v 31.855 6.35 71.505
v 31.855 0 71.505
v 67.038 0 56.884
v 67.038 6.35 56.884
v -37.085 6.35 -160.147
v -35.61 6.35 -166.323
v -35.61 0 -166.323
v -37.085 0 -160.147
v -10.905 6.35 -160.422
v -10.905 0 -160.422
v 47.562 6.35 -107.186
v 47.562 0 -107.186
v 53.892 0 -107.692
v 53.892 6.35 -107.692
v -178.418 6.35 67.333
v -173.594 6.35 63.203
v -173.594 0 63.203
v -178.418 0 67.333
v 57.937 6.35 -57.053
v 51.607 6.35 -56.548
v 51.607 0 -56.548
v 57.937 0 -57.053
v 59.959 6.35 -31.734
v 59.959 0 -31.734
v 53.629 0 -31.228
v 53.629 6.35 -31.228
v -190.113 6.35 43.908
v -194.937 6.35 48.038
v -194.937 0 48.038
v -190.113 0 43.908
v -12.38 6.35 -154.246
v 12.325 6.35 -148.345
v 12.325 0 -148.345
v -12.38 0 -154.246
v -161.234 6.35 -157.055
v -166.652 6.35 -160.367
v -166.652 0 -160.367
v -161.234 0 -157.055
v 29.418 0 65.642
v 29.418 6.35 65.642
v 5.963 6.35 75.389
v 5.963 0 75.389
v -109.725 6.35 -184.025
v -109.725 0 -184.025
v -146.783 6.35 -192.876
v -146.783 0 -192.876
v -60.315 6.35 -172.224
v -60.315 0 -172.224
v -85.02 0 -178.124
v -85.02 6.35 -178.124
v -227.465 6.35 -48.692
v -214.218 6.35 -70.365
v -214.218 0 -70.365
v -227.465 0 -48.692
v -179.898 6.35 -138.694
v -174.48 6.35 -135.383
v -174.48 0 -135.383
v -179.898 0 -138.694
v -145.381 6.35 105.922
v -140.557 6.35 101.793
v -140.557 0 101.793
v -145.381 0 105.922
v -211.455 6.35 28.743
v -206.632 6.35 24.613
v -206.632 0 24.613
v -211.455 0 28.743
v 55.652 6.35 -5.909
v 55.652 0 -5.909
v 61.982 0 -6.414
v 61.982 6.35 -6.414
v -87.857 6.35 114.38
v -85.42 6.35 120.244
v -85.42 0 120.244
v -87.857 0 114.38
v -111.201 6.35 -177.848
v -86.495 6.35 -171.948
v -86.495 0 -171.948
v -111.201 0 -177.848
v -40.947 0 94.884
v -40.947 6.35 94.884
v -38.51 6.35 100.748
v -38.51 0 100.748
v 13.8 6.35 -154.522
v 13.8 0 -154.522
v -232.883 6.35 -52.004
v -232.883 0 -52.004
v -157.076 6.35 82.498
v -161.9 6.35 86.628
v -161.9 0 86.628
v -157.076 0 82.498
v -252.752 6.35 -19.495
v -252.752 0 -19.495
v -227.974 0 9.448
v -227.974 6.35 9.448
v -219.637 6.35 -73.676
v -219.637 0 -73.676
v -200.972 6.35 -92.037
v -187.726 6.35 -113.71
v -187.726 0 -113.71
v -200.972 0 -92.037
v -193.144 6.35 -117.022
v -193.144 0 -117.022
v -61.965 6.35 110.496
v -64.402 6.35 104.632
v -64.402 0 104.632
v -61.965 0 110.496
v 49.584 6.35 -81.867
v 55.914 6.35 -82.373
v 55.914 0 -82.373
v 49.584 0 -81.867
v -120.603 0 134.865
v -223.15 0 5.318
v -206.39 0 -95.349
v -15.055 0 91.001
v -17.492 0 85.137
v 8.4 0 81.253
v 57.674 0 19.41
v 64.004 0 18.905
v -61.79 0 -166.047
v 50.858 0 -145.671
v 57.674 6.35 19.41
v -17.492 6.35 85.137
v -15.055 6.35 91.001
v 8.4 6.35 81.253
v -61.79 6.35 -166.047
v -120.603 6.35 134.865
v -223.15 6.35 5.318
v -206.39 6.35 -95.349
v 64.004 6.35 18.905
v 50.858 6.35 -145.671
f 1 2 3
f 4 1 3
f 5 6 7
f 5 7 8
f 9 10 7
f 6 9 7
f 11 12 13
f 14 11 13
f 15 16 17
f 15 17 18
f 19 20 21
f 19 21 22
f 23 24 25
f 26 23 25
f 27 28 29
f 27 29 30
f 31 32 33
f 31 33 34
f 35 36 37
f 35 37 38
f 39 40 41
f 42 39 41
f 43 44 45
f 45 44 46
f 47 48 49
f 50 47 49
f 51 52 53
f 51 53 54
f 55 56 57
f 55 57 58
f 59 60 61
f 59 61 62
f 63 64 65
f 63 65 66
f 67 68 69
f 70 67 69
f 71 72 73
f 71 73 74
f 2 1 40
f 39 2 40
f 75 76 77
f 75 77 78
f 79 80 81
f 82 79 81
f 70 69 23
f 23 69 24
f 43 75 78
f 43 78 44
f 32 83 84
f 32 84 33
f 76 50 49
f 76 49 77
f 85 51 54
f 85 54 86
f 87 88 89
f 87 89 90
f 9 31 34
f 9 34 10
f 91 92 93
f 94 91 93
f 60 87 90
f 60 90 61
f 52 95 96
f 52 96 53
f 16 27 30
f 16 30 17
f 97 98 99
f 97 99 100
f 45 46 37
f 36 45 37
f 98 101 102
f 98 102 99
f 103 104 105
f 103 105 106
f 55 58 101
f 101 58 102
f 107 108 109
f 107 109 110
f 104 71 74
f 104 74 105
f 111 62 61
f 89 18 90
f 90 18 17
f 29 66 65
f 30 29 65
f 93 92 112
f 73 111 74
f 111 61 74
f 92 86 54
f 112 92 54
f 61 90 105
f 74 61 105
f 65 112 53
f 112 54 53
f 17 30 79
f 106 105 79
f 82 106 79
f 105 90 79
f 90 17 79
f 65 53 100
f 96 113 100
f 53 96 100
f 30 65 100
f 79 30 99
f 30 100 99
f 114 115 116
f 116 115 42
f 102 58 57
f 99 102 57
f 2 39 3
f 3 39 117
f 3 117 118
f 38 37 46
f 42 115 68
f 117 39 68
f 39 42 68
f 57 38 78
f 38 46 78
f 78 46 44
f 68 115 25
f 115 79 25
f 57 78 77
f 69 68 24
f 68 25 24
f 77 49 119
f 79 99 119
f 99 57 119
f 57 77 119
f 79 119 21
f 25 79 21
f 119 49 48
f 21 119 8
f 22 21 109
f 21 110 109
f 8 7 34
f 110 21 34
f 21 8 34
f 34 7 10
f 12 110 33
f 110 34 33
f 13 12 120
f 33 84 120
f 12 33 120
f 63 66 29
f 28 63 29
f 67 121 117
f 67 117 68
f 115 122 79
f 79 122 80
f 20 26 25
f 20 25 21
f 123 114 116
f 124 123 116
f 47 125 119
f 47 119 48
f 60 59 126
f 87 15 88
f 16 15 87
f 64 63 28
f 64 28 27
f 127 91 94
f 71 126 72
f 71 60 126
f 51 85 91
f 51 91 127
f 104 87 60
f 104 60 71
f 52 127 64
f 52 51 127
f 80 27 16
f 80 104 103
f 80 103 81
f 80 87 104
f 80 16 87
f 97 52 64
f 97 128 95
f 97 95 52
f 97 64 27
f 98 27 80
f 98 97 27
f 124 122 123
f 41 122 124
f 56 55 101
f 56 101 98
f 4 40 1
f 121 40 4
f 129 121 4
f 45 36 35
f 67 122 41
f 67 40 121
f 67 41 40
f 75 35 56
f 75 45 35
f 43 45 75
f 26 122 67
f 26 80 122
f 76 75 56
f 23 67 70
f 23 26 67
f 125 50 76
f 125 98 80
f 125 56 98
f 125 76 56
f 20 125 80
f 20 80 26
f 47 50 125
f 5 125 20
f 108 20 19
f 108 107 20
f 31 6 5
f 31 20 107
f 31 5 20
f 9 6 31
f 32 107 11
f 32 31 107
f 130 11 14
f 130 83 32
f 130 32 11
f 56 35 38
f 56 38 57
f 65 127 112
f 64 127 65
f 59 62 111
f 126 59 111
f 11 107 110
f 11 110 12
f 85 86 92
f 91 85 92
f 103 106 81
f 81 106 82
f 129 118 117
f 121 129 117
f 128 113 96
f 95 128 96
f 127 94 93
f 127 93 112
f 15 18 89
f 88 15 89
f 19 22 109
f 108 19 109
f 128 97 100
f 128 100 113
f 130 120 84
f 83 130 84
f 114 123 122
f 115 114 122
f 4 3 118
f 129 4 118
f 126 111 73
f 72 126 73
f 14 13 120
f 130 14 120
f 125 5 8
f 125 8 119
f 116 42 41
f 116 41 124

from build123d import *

# Parameters (mm, degrees)
BOSS_EXTRUDE1_DEPTH = 6.35
CUT_EXTRUDE1_DEPTH  = 7.35


with BuildPart() as part:
    # Sketch1 → Boss-Extrude1 (new body)
    with BuildSketch(Plane(origin=(0, 0, 0), x_dir=(1, 0, 0), z_dir=(0, 1, 0))):
        Polygon((67.038031479, -56.883887939), (50.857913673, 145.670904124), (-146.783072598, 192.87557069), (-252.751801878, 19.494866992), (-120.603092047, -134.864967453), align=None)
    extrude(amount=BOSS_EXTRUDE1_DEPTH)

    # Sketch2 → Cut-Extrude1 (cut, through all)
    with BuildSketch(Plane(origin=(0, 6.35, 0), x_dir=(1, 0, 0), z_dir=(0, 1, 0))):
        Polygon((-87.85729012, -114.379729934), (-64.40214968, -104.632094995), (-61.965240945, -110.495880105), (-85.420381385, -120.243515044), align=None)
        Polygon((-38.510100504, -100.748245166), (-15.054960063, -91.000610226), (-17.491868798, -85.136825116), (-40.947009239, -94.884460055), align=None)
        Polygon((8.400180377, -81.252975287), (31.855320818, -71.505340348), (29.418412083, -65.641555238), (5.963271643, -75.389190177), align=None)
        Polygon((-223.150173958, -5.317954784), (-206.631585229, -24.61293409), (-211.455330056, -28.742581272), (-227.973918785, -9.447601966), align=None)
        Polygon((-194.936741327, -48.037560577), (-190.112996501, -43.907913395), (-173.594407772, -63.202892701), (-178.418152598, -67.332539883), align=None)
        Polygon((-161.899563869, -86.627519189), (-157.075819043, -82.497872006), (-140.557230314, -101.792851312), (-145.38097514, -105.922498494), align=None)
        Polygon((-161.234062348, 157.055165957), (-174.480153508, 135.382577994), (-179.898300498, 138.694100784), (-166.652209338, 160.366688747), align=None)
        Polygon((-193.144391658, 117.021512822), (-187.726244668, 113.709990032), (-200.972335828, 92.03740207), (-206.390482818, 95.34892486), align=None)
        Polygon((-219.636573978, 73.676336898), (-214.218426988, 70.364814108), (-227.464518148, 48.692226145), (-232.882665138, 52.003748935), align=None)
        Polygon((12.325082917, 148.345498284), (-12.380040367, 154.246081605), (-10.904894536, 160.422362426), (13.800228747, 154.521779105), align=None)
        Polygon((-35.61001782, 166.322945747), (-37.085163651, 160.146664926), (-61.790286935, 166.047248246), (-60.315141104, 172.223529067), align=None)
        Polygon((-85.020264388, 178.124112388), (-86.495410219, 171.947831567), (-111.200533502, 177.848414888), (-109.725387672, 184.024695709), align=None)
        Polygon((57.674422139, -19.410493109), (55.651907413, 5.908855899), (61.981744665, 6.41448458), (64.004259391, -18.904864428), align=None)
        Polygon((59.959229939, 31.733833588), (53.629392687, 31.228204907), (51.606877961, 56.547553915), (57.936715213, 57.053182596), align=None)
        Polygon((55.914200488, 82.372531604), (49.584363236, 81.866902923), (47.56184851, 107.186251931), (53.891685762, 107.691880612), align=None)
    extrude(amount=-CUT_EXTRUDE1_DEPTH, mode=Mode.SUBTRACT)


solid = part.part
